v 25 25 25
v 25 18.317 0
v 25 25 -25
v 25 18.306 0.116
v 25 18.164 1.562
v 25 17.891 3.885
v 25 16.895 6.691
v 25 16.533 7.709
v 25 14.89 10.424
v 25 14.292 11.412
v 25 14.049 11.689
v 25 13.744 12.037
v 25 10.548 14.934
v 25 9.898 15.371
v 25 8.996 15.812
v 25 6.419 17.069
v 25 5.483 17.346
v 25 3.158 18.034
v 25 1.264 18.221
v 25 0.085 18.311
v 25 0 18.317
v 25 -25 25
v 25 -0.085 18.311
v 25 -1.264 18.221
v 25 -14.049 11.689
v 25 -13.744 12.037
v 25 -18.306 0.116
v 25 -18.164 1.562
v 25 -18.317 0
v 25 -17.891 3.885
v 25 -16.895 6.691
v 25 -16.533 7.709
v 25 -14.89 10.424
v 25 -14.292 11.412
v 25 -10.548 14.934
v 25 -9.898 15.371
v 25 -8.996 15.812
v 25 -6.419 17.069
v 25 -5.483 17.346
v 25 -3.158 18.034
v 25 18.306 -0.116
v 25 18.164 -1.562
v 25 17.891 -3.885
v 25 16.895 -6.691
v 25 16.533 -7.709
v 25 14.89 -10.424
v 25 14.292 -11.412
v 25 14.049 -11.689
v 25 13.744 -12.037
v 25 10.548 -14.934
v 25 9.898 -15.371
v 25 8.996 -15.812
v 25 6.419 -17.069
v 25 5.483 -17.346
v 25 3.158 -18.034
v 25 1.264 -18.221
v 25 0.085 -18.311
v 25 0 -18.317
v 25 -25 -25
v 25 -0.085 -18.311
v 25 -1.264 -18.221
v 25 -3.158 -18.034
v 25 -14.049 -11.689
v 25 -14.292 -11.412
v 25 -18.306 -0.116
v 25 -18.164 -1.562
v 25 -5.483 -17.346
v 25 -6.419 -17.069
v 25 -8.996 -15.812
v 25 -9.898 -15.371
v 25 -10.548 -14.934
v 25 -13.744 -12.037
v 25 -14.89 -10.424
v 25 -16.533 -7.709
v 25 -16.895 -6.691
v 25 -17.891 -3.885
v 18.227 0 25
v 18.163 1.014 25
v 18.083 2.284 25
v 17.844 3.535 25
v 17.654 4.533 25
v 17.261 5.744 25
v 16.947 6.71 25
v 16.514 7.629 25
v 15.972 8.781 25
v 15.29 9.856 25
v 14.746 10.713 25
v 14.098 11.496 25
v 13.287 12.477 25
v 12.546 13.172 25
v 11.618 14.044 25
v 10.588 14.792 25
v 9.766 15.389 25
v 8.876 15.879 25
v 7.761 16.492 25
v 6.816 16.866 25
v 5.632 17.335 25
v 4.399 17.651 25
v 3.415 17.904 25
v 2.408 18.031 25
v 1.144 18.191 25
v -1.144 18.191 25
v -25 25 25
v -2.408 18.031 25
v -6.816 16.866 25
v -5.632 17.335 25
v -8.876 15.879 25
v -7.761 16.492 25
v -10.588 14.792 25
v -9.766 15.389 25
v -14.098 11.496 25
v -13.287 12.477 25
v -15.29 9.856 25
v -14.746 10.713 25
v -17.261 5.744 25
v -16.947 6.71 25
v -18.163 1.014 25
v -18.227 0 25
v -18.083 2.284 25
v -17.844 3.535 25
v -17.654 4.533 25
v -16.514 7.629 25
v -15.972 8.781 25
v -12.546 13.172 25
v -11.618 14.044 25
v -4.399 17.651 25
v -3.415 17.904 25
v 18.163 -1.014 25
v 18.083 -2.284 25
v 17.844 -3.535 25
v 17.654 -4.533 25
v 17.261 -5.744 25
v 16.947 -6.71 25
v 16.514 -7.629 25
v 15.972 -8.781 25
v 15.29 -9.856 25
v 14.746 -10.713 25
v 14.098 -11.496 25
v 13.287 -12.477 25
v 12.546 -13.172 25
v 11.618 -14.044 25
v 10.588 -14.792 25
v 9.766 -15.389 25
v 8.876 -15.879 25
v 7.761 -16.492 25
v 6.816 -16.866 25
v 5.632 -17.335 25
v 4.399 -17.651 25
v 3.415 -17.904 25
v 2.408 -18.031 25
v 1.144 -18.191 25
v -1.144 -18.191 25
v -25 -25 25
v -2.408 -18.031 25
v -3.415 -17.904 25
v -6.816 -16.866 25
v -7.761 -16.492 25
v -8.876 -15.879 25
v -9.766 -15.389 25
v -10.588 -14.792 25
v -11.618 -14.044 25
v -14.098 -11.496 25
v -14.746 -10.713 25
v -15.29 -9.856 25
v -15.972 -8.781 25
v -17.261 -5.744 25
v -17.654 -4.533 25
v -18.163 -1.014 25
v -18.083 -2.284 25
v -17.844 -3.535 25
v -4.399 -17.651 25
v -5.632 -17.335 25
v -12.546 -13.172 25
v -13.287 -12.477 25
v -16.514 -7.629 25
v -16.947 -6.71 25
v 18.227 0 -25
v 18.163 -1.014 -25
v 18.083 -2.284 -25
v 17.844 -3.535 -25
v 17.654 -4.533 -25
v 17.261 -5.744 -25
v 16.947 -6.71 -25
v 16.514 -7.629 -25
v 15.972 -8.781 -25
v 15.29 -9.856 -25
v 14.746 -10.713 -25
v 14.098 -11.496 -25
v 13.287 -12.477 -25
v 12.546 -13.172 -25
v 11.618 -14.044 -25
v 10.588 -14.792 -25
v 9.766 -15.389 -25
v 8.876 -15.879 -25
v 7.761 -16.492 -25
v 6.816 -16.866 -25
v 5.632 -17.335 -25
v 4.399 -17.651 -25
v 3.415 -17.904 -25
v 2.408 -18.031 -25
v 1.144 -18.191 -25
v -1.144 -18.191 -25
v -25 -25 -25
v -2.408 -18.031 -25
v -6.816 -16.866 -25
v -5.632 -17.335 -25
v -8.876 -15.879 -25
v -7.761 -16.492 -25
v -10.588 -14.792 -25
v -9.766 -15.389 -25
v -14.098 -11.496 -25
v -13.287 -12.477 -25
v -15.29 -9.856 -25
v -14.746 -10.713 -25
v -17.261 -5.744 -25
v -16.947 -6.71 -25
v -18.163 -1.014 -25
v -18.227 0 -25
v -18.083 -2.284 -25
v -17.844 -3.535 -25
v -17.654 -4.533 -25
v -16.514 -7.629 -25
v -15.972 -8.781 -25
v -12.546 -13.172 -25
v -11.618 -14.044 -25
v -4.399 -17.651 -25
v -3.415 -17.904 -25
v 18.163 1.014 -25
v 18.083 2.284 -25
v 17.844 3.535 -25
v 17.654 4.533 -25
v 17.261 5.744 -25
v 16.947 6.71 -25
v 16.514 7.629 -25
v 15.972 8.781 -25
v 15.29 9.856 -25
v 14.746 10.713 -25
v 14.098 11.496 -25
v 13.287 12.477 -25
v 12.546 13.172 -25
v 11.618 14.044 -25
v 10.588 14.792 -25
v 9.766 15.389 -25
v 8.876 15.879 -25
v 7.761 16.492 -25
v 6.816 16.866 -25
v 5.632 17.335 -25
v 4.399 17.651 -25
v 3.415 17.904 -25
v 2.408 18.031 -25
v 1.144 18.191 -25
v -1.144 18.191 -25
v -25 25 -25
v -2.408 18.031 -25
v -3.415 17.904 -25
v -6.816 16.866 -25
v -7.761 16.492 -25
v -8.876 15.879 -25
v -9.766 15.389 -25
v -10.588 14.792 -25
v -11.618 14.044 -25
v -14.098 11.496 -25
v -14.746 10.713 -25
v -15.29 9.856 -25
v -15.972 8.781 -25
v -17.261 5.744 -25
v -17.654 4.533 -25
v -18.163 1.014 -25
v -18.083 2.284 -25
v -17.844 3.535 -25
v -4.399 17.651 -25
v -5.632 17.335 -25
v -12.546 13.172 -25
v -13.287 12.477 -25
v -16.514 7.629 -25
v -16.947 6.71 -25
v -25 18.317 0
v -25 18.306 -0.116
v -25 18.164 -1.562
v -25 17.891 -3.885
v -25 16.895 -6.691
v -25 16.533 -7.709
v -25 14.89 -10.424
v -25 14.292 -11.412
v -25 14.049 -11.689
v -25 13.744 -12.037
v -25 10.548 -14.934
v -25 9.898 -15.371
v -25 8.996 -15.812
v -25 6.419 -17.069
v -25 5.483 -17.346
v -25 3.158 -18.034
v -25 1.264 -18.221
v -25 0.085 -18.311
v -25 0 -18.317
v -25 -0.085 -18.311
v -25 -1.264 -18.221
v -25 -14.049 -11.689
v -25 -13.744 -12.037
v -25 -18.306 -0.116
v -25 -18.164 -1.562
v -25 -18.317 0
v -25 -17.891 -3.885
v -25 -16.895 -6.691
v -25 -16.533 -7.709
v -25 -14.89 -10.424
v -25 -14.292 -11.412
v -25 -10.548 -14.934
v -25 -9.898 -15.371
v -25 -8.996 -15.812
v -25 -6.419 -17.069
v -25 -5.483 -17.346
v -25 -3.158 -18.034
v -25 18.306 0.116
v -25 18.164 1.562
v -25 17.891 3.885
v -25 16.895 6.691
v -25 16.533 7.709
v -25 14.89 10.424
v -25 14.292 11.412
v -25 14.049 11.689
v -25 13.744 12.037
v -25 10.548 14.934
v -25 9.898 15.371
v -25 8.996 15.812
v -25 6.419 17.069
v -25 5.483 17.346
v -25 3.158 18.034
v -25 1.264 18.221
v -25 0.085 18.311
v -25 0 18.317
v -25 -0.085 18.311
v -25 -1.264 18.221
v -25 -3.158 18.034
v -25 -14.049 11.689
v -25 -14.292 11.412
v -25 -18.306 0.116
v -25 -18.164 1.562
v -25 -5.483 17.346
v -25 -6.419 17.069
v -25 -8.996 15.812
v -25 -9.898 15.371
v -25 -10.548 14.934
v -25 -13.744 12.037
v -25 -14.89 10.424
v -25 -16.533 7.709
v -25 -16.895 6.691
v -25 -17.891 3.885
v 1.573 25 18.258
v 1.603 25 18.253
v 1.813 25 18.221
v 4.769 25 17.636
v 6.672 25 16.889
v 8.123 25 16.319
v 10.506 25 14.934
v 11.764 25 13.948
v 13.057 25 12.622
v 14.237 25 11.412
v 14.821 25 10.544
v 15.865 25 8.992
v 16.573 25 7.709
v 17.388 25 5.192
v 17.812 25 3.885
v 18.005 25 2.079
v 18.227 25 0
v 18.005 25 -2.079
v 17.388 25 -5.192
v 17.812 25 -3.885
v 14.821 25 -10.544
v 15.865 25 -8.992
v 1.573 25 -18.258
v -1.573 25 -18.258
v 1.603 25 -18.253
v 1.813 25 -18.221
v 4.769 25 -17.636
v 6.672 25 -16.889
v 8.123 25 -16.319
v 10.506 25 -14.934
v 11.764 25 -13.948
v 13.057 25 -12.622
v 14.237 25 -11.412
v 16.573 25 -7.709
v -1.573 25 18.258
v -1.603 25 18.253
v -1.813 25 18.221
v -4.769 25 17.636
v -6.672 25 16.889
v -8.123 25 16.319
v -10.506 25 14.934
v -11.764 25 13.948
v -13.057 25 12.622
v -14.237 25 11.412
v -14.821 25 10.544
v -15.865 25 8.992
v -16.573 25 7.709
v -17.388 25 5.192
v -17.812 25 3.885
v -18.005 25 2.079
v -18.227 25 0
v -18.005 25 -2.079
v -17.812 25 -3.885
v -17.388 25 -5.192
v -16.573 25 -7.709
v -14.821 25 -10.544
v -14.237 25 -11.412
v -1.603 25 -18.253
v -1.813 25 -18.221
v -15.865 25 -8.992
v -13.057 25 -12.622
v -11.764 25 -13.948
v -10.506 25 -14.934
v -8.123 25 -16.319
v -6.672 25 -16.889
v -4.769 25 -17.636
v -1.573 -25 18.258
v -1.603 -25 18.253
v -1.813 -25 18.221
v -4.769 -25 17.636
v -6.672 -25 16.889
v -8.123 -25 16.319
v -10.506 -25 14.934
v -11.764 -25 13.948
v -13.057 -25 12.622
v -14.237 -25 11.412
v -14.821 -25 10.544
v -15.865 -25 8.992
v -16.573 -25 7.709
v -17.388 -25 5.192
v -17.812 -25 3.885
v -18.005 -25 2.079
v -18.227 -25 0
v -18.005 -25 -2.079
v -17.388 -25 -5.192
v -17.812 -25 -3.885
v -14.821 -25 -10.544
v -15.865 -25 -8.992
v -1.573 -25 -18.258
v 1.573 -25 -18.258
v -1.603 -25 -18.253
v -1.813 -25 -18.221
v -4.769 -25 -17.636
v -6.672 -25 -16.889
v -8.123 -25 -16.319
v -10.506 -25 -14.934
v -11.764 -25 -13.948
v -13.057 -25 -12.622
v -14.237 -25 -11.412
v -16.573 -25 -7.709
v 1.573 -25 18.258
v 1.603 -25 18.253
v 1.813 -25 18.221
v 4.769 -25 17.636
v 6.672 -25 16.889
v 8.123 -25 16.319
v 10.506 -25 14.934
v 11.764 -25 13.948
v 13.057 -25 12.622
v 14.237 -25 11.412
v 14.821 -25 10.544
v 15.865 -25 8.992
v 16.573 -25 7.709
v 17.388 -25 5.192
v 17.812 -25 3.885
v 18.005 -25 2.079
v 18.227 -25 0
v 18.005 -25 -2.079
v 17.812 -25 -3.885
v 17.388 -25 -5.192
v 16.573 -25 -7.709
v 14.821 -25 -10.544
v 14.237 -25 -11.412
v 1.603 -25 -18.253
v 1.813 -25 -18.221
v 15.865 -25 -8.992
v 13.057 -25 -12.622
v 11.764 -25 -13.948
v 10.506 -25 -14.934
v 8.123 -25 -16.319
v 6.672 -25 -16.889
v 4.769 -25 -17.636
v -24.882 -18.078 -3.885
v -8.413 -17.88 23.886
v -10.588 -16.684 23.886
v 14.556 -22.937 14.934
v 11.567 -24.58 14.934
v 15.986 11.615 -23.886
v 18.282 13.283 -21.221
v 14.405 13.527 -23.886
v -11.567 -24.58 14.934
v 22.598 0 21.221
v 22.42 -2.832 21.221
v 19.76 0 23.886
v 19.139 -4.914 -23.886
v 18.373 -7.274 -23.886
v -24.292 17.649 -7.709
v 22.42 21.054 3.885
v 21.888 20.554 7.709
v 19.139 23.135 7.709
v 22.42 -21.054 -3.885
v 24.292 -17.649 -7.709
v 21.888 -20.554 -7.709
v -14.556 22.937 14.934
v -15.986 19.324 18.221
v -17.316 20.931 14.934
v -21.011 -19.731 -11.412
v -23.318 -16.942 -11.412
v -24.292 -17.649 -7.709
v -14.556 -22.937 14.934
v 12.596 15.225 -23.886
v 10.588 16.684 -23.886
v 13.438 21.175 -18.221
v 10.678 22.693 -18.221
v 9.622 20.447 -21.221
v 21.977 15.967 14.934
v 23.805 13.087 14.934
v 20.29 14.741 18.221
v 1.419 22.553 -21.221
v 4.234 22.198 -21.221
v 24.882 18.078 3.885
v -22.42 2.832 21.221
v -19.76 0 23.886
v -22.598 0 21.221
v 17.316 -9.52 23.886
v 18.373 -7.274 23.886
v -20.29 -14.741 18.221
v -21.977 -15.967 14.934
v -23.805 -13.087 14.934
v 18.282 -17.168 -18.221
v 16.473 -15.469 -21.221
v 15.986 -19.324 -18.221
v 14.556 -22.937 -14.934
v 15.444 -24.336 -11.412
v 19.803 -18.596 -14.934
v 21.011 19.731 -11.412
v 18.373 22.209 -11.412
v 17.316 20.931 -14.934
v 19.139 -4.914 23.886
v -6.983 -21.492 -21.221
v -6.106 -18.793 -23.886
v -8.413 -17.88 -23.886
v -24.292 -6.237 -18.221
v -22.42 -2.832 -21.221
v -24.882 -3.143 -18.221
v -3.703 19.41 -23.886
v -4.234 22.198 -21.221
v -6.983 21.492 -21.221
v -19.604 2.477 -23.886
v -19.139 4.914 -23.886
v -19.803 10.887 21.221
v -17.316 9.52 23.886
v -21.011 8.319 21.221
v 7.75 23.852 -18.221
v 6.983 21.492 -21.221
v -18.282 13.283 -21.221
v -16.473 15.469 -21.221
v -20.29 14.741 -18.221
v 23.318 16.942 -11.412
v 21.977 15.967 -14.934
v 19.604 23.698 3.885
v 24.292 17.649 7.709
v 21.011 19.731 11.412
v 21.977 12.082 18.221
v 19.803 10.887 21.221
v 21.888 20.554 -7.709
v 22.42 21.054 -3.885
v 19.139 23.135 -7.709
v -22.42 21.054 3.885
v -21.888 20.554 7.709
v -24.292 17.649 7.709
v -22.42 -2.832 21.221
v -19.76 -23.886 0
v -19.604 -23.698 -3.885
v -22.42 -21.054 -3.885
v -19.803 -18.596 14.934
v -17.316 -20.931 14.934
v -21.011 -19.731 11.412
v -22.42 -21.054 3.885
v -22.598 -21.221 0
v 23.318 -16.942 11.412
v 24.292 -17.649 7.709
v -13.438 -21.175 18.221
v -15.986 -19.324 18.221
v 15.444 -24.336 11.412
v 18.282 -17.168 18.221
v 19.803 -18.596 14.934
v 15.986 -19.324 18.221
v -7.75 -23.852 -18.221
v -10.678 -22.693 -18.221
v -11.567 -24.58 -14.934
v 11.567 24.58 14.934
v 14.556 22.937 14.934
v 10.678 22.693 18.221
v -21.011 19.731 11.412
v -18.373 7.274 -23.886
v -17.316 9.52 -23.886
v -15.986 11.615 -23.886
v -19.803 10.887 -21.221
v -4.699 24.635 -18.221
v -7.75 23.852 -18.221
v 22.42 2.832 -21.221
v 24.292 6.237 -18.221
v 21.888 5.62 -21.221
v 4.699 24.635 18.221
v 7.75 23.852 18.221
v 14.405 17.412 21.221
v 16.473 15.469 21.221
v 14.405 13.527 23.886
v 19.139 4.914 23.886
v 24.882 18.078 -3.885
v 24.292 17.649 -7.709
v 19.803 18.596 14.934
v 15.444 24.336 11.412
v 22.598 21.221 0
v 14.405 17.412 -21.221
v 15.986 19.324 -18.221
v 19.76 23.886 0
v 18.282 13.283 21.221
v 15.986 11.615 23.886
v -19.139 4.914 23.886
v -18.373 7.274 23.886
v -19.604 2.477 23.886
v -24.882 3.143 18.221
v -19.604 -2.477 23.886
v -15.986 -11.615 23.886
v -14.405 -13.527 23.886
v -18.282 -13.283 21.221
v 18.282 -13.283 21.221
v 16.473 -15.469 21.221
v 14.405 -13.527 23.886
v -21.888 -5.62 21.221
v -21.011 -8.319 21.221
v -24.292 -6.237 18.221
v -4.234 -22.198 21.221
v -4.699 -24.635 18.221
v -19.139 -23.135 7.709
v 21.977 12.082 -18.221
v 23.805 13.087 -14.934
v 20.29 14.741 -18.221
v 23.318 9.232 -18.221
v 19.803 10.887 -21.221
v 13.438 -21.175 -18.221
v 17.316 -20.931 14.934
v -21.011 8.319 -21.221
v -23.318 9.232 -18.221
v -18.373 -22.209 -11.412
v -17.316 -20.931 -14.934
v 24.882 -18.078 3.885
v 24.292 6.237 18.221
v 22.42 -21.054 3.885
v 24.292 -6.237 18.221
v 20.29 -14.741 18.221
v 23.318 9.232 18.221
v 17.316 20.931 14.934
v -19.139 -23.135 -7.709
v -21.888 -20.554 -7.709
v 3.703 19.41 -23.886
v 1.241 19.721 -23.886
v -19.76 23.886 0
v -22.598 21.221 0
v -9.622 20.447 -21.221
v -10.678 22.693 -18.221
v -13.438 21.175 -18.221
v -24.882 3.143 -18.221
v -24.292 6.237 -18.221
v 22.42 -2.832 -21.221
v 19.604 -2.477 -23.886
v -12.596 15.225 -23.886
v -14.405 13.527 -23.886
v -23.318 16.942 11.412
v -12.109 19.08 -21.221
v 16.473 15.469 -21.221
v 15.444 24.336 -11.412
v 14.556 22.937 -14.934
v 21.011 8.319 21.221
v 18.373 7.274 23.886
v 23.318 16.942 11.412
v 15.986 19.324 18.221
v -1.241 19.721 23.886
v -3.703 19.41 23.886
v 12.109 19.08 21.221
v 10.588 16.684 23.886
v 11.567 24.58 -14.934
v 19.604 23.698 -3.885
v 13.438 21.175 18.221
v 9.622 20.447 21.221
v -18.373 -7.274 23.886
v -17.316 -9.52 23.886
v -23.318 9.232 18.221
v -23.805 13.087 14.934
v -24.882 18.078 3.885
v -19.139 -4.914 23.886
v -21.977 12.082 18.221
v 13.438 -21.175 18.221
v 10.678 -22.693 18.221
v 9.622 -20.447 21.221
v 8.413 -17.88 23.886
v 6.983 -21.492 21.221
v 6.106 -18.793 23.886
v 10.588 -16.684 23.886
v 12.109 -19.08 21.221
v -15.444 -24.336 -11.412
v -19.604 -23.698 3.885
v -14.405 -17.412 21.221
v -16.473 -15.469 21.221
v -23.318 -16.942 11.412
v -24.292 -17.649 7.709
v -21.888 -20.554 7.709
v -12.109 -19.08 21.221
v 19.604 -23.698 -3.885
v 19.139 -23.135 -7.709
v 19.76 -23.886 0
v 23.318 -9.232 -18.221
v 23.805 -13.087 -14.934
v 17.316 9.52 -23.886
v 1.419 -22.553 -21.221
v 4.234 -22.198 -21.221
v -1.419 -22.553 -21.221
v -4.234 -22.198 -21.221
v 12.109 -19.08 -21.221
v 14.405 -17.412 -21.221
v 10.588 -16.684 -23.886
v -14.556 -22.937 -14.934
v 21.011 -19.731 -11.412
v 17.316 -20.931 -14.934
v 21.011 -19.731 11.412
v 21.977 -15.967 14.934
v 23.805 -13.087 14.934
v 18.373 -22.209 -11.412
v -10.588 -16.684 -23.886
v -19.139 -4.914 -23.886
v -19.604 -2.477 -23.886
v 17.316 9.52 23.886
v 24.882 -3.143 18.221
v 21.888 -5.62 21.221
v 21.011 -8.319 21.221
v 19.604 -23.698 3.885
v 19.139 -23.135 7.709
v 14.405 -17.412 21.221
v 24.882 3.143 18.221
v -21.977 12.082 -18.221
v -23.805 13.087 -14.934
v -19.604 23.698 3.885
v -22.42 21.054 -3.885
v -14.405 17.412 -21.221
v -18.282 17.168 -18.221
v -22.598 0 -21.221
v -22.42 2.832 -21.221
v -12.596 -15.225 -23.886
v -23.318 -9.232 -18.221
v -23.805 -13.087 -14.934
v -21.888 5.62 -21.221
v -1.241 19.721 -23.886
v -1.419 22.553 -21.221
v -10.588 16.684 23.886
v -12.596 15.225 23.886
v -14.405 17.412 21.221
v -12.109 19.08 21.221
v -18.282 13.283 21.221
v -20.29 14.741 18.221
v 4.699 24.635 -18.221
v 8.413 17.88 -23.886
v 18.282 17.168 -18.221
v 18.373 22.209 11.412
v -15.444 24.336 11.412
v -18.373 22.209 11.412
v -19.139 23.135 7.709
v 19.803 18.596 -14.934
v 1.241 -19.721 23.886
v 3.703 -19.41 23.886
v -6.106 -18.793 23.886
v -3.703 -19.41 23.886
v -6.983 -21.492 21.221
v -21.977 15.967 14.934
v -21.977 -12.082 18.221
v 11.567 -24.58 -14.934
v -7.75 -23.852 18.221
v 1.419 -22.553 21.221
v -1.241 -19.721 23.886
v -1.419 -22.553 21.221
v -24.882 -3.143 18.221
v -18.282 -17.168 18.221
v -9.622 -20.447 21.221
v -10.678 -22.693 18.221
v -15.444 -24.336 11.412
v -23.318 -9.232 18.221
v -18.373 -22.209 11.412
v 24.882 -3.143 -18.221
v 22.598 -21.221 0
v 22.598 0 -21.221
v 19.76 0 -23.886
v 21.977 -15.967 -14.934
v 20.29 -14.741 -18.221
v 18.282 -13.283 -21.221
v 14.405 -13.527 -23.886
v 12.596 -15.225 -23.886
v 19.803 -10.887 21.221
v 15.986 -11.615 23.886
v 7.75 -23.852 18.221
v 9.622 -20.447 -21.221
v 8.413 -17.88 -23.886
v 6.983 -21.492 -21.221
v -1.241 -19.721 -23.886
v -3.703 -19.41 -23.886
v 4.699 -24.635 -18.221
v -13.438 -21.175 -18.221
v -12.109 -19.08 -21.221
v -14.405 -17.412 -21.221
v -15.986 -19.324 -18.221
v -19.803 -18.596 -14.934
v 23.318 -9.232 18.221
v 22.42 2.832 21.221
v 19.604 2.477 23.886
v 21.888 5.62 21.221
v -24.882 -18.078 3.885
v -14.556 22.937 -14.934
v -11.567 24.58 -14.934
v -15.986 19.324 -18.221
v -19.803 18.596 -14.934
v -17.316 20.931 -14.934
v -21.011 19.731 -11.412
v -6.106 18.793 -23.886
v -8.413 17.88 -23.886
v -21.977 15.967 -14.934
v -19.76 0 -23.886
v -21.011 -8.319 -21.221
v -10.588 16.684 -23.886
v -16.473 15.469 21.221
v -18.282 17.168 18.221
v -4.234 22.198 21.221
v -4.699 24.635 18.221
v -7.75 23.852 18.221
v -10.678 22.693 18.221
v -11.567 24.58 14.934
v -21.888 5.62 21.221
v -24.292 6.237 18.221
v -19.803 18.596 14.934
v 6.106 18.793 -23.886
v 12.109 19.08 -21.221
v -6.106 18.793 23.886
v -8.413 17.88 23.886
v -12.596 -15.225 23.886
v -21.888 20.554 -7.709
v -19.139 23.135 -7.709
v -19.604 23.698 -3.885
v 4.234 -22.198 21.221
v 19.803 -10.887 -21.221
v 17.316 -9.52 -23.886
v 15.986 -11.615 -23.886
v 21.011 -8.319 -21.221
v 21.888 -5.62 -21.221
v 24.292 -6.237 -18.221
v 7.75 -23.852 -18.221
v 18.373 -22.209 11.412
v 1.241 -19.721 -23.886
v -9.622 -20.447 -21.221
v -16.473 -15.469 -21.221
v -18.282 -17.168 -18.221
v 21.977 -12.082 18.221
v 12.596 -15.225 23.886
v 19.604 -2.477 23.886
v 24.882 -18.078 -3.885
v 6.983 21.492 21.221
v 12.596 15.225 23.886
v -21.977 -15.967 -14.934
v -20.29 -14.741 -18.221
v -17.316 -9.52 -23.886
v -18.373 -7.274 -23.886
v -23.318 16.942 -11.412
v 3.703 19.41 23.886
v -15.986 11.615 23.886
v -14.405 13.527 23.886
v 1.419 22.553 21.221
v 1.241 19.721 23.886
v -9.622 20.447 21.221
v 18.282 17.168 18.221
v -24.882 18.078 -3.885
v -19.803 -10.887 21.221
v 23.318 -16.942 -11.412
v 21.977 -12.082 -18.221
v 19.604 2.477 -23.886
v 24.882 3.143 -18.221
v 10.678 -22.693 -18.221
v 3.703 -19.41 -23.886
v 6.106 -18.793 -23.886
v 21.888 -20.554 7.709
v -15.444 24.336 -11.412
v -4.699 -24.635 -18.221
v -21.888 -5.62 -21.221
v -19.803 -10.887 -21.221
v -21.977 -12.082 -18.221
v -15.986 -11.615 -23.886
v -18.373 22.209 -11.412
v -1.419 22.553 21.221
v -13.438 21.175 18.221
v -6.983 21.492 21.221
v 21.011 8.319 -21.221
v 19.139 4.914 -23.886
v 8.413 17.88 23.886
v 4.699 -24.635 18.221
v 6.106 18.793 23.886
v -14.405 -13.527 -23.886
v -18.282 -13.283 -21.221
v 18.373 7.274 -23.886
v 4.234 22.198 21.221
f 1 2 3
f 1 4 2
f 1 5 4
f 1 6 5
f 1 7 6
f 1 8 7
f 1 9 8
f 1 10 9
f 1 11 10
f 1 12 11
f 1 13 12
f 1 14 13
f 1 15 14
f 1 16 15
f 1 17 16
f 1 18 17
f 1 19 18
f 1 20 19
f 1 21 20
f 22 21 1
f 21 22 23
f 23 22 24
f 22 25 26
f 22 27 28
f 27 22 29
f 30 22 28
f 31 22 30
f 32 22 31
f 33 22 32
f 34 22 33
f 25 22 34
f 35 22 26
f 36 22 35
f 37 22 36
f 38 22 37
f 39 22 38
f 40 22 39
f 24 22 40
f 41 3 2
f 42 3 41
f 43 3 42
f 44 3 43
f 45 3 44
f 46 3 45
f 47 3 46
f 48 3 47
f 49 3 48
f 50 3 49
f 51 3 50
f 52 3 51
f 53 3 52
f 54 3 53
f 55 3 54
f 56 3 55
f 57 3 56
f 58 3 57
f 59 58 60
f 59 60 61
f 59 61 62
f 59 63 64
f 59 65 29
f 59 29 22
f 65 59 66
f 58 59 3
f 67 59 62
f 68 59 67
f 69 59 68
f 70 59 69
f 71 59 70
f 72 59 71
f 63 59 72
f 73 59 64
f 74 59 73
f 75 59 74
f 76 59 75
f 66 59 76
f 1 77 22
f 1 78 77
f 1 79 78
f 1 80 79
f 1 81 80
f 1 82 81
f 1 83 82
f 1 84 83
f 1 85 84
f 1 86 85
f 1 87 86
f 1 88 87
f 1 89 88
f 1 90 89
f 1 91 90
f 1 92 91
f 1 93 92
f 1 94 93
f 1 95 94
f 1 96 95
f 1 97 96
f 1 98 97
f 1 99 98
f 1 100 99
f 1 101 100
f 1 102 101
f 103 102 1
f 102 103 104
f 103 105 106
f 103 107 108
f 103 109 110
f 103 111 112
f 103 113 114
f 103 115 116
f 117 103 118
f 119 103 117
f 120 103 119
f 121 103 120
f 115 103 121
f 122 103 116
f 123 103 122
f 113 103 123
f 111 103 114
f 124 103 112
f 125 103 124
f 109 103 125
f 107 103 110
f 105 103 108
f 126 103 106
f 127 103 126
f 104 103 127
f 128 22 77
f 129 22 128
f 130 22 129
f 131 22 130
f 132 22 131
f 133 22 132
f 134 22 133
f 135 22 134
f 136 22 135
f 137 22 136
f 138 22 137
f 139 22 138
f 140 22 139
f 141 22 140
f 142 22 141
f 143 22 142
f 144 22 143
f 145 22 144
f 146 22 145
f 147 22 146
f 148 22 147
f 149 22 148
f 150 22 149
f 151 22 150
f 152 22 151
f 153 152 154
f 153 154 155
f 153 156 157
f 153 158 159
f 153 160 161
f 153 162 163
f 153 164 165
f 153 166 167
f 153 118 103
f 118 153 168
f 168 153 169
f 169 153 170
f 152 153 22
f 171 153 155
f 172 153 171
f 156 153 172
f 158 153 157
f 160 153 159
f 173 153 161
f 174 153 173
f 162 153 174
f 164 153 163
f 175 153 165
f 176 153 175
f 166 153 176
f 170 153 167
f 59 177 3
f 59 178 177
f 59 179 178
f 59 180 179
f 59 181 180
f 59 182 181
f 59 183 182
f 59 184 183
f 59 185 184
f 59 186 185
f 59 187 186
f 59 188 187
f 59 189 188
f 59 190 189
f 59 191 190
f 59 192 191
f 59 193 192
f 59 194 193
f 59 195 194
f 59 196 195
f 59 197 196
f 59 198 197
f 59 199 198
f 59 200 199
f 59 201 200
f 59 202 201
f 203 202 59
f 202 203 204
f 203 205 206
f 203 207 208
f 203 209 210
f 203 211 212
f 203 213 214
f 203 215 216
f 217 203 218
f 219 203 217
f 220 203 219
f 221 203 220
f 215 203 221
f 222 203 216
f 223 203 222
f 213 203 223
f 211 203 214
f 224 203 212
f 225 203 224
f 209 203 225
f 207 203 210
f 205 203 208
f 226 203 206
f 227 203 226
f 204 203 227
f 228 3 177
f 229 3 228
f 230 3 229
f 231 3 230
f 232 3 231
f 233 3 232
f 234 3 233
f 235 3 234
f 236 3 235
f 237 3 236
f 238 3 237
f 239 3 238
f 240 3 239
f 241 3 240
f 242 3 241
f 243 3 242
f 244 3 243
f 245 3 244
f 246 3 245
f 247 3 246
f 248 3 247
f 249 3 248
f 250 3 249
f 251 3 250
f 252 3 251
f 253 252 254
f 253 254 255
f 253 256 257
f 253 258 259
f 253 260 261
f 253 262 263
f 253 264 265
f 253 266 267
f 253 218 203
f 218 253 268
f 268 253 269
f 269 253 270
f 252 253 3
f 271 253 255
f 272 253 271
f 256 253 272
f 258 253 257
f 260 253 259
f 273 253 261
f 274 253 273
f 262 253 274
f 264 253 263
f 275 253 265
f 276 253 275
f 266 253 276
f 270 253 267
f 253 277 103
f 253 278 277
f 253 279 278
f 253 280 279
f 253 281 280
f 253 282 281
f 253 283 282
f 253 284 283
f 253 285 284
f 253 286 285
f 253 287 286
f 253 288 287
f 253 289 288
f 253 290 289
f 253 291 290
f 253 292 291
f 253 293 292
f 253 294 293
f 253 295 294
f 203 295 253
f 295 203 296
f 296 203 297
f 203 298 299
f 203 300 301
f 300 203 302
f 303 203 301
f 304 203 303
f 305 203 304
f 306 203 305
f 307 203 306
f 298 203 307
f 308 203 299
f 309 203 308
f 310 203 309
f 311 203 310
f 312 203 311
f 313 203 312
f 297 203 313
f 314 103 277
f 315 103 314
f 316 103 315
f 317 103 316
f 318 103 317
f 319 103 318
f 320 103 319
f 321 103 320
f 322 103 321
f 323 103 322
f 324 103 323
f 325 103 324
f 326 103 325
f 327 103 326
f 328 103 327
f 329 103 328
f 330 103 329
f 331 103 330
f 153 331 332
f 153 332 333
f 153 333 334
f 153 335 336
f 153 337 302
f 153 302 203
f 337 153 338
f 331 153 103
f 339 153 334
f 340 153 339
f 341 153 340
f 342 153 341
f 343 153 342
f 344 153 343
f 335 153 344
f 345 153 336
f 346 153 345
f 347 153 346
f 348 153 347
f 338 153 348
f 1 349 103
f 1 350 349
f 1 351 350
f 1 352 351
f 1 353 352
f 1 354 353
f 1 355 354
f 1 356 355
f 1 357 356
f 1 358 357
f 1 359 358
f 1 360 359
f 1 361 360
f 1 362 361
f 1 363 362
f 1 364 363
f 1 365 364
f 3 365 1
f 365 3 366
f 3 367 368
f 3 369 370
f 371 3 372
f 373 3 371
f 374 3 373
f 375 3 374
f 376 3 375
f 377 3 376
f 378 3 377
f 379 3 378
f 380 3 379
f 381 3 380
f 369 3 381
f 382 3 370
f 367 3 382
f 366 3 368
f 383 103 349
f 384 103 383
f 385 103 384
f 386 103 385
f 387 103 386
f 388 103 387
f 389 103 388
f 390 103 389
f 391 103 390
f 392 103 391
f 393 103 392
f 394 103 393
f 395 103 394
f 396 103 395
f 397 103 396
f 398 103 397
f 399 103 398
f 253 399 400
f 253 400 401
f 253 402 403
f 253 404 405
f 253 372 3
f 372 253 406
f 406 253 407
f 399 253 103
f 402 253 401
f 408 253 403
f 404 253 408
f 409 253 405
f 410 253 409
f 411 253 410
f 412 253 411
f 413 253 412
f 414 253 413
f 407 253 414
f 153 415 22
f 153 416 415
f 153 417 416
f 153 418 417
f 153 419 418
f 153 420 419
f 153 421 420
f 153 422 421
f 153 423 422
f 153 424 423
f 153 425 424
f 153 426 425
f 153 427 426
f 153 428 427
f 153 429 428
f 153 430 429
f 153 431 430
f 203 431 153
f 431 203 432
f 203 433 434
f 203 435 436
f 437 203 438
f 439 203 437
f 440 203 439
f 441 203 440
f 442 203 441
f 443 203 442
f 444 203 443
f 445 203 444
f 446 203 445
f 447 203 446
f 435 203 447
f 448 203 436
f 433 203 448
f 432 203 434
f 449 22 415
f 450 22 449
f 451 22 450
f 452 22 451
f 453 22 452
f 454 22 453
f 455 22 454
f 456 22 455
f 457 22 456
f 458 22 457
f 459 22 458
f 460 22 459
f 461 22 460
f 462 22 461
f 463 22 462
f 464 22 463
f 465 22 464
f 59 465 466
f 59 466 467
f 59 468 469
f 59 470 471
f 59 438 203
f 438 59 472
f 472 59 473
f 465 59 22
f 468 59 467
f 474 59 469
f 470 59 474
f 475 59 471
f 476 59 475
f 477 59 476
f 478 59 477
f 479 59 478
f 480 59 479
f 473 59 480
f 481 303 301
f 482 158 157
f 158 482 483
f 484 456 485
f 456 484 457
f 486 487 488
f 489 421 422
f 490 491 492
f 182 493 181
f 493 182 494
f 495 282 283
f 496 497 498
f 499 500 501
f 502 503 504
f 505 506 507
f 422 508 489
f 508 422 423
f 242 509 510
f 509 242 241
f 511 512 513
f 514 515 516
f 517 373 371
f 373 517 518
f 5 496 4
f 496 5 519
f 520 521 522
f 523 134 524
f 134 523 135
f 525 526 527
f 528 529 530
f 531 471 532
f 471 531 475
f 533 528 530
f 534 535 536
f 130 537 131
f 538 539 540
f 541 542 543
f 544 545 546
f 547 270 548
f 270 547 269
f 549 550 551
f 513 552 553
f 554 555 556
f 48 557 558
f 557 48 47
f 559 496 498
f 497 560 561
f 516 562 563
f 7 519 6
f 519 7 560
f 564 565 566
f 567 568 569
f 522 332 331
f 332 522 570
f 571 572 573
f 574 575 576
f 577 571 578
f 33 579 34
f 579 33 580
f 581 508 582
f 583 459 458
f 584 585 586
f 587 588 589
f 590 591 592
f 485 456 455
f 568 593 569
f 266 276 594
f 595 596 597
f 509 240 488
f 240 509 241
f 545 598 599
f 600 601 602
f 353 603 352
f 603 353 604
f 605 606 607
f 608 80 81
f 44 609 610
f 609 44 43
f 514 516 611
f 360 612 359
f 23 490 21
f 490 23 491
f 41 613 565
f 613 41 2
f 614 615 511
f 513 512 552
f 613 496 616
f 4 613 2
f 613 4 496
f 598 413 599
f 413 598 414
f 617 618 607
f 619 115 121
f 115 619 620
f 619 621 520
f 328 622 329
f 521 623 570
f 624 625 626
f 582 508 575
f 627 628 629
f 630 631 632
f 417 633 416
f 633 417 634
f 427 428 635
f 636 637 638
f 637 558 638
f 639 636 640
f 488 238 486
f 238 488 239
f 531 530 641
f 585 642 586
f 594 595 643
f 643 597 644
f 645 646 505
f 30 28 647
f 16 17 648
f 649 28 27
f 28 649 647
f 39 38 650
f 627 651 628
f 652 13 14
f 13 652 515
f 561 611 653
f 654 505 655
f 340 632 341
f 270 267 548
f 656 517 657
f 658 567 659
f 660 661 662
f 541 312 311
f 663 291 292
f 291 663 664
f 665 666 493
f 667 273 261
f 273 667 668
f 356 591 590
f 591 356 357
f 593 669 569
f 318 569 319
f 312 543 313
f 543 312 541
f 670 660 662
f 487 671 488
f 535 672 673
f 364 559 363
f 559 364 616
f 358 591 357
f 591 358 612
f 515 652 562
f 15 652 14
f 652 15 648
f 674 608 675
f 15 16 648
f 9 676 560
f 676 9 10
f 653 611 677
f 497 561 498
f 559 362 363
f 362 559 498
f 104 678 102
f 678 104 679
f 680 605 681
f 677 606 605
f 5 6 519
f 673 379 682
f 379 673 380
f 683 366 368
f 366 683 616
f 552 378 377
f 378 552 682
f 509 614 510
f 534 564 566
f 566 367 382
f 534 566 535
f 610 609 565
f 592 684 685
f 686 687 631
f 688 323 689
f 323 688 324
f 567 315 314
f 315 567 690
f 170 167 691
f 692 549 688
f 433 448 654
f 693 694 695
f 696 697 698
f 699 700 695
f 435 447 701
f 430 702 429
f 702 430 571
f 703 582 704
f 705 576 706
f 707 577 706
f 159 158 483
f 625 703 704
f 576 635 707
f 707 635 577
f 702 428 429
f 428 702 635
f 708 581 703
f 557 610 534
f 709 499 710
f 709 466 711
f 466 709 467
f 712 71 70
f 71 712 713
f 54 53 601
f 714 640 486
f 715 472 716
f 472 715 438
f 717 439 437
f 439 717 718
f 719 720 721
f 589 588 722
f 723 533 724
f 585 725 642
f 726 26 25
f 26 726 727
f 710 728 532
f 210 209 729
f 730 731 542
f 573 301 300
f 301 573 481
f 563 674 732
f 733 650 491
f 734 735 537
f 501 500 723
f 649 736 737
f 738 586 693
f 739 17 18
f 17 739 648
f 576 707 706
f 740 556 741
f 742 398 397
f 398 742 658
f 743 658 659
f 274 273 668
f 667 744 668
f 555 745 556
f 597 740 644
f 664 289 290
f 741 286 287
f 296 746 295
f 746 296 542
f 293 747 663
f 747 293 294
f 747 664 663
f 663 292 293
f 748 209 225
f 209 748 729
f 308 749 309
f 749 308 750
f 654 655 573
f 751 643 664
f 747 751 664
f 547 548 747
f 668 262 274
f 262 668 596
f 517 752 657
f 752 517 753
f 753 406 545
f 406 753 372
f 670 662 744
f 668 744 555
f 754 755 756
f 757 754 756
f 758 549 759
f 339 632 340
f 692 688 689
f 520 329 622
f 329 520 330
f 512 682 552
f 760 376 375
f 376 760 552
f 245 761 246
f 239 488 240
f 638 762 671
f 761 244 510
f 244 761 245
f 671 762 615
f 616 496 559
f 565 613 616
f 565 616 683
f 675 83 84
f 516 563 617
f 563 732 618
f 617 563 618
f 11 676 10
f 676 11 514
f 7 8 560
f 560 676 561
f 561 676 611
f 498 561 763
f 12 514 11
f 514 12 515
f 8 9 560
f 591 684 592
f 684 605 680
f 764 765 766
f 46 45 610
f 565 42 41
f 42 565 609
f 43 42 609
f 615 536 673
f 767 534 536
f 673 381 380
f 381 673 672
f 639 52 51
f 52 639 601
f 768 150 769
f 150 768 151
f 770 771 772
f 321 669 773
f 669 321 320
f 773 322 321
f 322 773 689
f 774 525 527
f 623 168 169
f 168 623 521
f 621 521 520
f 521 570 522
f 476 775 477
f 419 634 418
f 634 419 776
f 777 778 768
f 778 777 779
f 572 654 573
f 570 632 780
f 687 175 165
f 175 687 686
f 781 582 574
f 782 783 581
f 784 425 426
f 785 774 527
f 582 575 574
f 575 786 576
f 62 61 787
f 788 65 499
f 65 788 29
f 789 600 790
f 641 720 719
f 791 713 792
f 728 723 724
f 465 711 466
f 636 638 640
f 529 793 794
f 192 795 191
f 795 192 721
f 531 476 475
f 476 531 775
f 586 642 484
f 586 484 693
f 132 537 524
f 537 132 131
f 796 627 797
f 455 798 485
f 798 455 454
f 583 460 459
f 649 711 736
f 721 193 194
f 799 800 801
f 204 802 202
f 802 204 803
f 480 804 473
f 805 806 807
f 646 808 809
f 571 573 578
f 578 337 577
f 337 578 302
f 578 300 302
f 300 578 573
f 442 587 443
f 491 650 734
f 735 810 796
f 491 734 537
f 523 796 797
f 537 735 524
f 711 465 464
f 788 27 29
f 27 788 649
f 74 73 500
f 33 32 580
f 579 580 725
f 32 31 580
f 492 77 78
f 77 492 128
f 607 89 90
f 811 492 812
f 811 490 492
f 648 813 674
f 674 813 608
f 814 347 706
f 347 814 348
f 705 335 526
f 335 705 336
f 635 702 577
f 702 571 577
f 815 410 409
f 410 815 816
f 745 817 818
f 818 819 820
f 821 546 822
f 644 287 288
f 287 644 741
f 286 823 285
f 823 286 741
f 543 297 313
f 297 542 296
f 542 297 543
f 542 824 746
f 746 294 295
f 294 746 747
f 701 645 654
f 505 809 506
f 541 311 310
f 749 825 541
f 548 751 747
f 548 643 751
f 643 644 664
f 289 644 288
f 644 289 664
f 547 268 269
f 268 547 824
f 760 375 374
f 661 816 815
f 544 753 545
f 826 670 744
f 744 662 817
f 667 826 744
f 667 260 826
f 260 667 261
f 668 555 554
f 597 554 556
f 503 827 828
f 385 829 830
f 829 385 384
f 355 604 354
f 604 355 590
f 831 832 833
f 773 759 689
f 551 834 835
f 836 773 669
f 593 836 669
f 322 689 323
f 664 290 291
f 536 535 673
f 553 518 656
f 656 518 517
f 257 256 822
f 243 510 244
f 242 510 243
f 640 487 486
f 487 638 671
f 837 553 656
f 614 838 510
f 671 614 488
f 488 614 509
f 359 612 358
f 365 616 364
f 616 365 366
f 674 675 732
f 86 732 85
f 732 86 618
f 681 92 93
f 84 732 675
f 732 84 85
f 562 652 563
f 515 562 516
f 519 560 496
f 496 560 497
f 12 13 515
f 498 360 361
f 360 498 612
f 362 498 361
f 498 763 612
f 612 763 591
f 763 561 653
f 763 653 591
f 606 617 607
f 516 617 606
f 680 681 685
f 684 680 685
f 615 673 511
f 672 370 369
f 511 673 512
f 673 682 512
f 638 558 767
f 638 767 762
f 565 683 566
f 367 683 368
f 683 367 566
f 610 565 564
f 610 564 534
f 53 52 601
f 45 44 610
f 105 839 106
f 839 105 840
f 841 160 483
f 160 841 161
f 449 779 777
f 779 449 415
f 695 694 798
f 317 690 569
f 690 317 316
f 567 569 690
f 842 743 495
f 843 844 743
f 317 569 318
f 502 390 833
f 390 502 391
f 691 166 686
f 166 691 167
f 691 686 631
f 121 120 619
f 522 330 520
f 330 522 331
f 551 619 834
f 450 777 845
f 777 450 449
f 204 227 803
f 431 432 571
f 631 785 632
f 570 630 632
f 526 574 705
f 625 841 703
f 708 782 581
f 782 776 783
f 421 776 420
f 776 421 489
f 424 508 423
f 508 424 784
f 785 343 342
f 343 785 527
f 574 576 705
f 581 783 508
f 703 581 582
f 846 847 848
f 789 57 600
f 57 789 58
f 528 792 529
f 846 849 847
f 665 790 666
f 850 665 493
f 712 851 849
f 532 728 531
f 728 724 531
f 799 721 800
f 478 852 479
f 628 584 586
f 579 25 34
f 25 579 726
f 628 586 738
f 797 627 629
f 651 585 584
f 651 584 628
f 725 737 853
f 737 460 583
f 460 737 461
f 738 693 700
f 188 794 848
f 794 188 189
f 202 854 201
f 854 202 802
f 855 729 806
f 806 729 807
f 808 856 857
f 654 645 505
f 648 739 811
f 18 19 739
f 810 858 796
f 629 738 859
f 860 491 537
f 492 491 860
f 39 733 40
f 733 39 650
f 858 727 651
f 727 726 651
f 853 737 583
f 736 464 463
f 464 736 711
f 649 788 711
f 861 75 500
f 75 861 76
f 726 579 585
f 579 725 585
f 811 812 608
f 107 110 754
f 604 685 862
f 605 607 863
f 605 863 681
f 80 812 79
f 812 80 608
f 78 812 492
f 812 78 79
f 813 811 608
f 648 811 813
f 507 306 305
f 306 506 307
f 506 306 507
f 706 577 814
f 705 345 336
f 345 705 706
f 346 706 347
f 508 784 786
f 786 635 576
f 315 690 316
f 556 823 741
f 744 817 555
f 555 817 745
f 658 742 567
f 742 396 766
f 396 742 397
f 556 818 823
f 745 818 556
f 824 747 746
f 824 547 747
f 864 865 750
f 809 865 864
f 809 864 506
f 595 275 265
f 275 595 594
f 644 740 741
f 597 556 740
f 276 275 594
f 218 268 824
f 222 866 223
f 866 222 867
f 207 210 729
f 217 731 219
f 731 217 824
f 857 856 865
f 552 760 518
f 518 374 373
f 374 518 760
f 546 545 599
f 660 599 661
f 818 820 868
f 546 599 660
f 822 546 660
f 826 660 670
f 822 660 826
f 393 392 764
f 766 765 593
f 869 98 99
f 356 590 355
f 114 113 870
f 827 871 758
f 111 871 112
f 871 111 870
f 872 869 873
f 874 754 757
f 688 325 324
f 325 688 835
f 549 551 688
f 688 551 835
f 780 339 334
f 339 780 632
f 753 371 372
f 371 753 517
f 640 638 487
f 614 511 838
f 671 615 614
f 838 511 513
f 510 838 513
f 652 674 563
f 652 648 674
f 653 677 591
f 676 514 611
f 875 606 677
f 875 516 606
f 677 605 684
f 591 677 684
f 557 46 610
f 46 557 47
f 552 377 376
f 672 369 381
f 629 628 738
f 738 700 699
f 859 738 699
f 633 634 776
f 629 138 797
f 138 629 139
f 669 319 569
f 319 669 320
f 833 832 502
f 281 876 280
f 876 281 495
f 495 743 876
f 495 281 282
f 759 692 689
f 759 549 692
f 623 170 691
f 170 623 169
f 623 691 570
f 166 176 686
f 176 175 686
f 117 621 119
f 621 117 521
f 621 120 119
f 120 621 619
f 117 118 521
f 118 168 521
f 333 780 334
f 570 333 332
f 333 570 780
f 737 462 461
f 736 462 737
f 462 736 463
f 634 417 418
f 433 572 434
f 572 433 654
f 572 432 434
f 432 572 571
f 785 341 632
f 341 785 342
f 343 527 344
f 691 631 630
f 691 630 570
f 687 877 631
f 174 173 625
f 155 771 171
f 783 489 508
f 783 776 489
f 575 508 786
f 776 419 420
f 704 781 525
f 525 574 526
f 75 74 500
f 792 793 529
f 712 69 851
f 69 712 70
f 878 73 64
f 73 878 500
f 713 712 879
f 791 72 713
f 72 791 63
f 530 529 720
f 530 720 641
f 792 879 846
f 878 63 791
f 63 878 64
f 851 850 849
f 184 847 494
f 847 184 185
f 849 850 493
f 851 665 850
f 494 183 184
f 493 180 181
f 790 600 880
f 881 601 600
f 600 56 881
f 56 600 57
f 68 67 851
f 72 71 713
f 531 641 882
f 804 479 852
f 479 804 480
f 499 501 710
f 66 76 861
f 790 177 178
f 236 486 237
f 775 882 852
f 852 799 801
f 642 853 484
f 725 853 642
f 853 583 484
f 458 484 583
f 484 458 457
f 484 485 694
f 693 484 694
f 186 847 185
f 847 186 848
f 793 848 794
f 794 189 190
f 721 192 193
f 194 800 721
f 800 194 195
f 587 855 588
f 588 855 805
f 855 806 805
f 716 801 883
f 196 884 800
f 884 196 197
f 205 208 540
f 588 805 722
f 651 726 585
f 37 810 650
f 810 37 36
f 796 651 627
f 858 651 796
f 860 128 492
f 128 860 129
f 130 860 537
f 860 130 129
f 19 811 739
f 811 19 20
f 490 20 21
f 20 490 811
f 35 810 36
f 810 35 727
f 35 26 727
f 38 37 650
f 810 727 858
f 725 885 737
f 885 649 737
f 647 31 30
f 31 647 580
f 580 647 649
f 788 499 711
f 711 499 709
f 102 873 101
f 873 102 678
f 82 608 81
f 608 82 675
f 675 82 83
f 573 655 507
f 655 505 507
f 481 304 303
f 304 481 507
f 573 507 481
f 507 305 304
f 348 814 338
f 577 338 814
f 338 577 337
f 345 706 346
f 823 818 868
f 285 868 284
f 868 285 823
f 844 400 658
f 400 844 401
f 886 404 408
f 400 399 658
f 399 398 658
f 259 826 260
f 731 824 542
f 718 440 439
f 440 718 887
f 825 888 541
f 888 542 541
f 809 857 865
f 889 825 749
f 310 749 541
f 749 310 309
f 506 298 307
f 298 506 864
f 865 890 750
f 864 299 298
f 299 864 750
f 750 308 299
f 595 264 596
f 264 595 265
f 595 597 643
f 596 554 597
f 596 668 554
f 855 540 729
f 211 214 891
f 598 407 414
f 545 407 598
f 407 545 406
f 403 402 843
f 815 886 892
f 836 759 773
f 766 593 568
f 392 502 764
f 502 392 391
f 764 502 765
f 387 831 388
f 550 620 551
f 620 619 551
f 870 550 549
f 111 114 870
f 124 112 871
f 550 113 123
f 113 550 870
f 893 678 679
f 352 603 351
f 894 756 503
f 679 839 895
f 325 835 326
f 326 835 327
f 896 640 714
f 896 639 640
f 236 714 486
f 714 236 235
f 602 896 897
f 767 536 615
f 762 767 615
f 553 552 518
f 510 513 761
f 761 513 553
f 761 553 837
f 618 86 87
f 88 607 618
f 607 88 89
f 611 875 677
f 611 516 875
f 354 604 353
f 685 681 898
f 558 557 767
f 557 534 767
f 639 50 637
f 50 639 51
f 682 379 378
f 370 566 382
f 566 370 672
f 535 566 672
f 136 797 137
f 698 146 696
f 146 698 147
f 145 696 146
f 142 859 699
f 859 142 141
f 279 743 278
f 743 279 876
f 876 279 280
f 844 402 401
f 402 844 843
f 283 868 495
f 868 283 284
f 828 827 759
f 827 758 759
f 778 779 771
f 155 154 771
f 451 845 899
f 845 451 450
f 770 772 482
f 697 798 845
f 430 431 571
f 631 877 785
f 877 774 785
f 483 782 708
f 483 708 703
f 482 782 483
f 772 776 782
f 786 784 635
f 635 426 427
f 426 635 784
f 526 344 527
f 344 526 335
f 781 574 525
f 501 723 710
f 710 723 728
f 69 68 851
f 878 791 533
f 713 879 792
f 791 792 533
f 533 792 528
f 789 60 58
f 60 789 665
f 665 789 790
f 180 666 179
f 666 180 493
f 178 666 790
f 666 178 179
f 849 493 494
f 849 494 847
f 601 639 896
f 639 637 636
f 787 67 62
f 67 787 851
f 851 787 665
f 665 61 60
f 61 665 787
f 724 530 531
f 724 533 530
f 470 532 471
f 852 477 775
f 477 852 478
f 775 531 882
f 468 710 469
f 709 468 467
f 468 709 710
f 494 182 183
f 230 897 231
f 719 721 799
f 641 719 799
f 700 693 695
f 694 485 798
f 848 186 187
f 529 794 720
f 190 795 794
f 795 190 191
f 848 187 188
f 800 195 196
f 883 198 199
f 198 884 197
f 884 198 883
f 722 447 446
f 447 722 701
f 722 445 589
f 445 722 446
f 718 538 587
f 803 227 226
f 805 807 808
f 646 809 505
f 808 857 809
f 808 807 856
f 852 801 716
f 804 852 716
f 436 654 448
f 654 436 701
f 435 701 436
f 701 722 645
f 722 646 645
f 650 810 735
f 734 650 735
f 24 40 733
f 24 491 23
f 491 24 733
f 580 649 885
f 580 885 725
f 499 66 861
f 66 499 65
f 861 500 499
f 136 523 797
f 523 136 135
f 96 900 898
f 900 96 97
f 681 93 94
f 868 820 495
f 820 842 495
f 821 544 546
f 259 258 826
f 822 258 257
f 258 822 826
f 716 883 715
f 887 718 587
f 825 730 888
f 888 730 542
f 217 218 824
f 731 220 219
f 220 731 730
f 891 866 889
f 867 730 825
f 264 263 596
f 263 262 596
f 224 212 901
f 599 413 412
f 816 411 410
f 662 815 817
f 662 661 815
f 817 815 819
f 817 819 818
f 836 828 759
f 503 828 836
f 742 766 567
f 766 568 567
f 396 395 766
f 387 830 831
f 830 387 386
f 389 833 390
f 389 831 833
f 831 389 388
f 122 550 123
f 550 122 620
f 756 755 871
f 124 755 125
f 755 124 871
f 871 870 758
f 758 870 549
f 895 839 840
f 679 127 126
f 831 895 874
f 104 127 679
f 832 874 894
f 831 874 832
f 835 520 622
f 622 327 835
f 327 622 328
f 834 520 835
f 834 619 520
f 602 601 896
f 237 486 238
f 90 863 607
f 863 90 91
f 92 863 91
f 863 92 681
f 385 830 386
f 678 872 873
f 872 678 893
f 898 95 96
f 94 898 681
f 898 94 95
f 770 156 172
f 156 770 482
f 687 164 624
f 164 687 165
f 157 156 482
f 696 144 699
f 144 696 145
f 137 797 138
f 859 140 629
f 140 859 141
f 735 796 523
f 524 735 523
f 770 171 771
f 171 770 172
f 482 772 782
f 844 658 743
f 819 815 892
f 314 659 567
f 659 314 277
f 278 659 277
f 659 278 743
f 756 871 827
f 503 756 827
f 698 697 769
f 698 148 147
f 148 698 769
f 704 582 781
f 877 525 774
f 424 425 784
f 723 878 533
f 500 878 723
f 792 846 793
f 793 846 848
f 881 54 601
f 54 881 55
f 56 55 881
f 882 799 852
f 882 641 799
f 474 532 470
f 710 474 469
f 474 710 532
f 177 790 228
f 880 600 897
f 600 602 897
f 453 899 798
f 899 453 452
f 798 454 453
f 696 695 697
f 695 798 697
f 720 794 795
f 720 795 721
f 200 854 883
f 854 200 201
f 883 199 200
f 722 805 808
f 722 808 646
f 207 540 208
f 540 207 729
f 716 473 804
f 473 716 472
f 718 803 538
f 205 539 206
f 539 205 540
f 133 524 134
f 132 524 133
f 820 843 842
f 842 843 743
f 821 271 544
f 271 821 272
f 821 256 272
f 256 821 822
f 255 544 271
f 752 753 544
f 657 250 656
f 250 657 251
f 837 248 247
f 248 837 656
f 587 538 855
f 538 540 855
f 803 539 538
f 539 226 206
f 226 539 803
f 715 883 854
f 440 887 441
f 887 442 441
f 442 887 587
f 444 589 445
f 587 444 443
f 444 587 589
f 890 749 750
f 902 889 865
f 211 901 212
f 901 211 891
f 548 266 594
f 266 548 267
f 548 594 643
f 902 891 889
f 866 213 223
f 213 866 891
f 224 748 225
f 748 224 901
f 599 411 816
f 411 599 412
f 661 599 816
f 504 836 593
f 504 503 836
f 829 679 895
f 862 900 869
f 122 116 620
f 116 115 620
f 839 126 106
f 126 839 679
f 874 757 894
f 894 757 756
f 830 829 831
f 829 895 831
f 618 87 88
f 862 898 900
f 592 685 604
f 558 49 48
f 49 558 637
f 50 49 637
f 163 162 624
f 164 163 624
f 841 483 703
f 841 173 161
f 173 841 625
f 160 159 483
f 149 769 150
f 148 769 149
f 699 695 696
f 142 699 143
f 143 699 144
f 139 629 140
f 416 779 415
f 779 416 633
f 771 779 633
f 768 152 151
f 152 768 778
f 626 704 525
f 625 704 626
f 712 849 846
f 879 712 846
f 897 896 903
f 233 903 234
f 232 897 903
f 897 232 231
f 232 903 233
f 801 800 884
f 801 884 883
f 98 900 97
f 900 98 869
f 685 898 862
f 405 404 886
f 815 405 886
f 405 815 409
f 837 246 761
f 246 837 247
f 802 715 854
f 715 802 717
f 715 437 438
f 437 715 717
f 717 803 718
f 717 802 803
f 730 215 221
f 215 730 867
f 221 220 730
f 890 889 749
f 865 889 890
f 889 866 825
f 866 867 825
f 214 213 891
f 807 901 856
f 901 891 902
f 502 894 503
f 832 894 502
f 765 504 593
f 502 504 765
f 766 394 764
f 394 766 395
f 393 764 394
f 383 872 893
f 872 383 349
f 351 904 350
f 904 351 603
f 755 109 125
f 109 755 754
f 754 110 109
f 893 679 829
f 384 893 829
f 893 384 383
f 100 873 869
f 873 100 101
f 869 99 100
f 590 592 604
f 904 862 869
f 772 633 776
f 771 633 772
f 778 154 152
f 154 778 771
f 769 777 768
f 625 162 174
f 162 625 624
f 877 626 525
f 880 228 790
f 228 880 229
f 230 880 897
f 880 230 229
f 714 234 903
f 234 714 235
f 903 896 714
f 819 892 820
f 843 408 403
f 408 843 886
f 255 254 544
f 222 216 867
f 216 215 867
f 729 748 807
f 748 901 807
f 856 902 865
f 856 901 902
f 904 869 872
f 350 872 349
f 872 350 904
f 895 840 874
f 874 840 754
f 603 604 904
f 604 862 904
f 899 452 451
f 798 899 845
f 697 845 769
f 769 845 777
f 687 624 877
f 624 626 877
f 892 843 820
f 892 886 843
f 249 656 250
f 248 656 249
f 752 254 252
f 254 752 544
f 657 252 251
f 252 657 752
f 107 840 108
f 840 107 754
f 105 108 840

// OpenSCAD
A = 50;
B = 31;

difference() {
cube(A, center=true );
sphere(B, $fn=50); 
}
